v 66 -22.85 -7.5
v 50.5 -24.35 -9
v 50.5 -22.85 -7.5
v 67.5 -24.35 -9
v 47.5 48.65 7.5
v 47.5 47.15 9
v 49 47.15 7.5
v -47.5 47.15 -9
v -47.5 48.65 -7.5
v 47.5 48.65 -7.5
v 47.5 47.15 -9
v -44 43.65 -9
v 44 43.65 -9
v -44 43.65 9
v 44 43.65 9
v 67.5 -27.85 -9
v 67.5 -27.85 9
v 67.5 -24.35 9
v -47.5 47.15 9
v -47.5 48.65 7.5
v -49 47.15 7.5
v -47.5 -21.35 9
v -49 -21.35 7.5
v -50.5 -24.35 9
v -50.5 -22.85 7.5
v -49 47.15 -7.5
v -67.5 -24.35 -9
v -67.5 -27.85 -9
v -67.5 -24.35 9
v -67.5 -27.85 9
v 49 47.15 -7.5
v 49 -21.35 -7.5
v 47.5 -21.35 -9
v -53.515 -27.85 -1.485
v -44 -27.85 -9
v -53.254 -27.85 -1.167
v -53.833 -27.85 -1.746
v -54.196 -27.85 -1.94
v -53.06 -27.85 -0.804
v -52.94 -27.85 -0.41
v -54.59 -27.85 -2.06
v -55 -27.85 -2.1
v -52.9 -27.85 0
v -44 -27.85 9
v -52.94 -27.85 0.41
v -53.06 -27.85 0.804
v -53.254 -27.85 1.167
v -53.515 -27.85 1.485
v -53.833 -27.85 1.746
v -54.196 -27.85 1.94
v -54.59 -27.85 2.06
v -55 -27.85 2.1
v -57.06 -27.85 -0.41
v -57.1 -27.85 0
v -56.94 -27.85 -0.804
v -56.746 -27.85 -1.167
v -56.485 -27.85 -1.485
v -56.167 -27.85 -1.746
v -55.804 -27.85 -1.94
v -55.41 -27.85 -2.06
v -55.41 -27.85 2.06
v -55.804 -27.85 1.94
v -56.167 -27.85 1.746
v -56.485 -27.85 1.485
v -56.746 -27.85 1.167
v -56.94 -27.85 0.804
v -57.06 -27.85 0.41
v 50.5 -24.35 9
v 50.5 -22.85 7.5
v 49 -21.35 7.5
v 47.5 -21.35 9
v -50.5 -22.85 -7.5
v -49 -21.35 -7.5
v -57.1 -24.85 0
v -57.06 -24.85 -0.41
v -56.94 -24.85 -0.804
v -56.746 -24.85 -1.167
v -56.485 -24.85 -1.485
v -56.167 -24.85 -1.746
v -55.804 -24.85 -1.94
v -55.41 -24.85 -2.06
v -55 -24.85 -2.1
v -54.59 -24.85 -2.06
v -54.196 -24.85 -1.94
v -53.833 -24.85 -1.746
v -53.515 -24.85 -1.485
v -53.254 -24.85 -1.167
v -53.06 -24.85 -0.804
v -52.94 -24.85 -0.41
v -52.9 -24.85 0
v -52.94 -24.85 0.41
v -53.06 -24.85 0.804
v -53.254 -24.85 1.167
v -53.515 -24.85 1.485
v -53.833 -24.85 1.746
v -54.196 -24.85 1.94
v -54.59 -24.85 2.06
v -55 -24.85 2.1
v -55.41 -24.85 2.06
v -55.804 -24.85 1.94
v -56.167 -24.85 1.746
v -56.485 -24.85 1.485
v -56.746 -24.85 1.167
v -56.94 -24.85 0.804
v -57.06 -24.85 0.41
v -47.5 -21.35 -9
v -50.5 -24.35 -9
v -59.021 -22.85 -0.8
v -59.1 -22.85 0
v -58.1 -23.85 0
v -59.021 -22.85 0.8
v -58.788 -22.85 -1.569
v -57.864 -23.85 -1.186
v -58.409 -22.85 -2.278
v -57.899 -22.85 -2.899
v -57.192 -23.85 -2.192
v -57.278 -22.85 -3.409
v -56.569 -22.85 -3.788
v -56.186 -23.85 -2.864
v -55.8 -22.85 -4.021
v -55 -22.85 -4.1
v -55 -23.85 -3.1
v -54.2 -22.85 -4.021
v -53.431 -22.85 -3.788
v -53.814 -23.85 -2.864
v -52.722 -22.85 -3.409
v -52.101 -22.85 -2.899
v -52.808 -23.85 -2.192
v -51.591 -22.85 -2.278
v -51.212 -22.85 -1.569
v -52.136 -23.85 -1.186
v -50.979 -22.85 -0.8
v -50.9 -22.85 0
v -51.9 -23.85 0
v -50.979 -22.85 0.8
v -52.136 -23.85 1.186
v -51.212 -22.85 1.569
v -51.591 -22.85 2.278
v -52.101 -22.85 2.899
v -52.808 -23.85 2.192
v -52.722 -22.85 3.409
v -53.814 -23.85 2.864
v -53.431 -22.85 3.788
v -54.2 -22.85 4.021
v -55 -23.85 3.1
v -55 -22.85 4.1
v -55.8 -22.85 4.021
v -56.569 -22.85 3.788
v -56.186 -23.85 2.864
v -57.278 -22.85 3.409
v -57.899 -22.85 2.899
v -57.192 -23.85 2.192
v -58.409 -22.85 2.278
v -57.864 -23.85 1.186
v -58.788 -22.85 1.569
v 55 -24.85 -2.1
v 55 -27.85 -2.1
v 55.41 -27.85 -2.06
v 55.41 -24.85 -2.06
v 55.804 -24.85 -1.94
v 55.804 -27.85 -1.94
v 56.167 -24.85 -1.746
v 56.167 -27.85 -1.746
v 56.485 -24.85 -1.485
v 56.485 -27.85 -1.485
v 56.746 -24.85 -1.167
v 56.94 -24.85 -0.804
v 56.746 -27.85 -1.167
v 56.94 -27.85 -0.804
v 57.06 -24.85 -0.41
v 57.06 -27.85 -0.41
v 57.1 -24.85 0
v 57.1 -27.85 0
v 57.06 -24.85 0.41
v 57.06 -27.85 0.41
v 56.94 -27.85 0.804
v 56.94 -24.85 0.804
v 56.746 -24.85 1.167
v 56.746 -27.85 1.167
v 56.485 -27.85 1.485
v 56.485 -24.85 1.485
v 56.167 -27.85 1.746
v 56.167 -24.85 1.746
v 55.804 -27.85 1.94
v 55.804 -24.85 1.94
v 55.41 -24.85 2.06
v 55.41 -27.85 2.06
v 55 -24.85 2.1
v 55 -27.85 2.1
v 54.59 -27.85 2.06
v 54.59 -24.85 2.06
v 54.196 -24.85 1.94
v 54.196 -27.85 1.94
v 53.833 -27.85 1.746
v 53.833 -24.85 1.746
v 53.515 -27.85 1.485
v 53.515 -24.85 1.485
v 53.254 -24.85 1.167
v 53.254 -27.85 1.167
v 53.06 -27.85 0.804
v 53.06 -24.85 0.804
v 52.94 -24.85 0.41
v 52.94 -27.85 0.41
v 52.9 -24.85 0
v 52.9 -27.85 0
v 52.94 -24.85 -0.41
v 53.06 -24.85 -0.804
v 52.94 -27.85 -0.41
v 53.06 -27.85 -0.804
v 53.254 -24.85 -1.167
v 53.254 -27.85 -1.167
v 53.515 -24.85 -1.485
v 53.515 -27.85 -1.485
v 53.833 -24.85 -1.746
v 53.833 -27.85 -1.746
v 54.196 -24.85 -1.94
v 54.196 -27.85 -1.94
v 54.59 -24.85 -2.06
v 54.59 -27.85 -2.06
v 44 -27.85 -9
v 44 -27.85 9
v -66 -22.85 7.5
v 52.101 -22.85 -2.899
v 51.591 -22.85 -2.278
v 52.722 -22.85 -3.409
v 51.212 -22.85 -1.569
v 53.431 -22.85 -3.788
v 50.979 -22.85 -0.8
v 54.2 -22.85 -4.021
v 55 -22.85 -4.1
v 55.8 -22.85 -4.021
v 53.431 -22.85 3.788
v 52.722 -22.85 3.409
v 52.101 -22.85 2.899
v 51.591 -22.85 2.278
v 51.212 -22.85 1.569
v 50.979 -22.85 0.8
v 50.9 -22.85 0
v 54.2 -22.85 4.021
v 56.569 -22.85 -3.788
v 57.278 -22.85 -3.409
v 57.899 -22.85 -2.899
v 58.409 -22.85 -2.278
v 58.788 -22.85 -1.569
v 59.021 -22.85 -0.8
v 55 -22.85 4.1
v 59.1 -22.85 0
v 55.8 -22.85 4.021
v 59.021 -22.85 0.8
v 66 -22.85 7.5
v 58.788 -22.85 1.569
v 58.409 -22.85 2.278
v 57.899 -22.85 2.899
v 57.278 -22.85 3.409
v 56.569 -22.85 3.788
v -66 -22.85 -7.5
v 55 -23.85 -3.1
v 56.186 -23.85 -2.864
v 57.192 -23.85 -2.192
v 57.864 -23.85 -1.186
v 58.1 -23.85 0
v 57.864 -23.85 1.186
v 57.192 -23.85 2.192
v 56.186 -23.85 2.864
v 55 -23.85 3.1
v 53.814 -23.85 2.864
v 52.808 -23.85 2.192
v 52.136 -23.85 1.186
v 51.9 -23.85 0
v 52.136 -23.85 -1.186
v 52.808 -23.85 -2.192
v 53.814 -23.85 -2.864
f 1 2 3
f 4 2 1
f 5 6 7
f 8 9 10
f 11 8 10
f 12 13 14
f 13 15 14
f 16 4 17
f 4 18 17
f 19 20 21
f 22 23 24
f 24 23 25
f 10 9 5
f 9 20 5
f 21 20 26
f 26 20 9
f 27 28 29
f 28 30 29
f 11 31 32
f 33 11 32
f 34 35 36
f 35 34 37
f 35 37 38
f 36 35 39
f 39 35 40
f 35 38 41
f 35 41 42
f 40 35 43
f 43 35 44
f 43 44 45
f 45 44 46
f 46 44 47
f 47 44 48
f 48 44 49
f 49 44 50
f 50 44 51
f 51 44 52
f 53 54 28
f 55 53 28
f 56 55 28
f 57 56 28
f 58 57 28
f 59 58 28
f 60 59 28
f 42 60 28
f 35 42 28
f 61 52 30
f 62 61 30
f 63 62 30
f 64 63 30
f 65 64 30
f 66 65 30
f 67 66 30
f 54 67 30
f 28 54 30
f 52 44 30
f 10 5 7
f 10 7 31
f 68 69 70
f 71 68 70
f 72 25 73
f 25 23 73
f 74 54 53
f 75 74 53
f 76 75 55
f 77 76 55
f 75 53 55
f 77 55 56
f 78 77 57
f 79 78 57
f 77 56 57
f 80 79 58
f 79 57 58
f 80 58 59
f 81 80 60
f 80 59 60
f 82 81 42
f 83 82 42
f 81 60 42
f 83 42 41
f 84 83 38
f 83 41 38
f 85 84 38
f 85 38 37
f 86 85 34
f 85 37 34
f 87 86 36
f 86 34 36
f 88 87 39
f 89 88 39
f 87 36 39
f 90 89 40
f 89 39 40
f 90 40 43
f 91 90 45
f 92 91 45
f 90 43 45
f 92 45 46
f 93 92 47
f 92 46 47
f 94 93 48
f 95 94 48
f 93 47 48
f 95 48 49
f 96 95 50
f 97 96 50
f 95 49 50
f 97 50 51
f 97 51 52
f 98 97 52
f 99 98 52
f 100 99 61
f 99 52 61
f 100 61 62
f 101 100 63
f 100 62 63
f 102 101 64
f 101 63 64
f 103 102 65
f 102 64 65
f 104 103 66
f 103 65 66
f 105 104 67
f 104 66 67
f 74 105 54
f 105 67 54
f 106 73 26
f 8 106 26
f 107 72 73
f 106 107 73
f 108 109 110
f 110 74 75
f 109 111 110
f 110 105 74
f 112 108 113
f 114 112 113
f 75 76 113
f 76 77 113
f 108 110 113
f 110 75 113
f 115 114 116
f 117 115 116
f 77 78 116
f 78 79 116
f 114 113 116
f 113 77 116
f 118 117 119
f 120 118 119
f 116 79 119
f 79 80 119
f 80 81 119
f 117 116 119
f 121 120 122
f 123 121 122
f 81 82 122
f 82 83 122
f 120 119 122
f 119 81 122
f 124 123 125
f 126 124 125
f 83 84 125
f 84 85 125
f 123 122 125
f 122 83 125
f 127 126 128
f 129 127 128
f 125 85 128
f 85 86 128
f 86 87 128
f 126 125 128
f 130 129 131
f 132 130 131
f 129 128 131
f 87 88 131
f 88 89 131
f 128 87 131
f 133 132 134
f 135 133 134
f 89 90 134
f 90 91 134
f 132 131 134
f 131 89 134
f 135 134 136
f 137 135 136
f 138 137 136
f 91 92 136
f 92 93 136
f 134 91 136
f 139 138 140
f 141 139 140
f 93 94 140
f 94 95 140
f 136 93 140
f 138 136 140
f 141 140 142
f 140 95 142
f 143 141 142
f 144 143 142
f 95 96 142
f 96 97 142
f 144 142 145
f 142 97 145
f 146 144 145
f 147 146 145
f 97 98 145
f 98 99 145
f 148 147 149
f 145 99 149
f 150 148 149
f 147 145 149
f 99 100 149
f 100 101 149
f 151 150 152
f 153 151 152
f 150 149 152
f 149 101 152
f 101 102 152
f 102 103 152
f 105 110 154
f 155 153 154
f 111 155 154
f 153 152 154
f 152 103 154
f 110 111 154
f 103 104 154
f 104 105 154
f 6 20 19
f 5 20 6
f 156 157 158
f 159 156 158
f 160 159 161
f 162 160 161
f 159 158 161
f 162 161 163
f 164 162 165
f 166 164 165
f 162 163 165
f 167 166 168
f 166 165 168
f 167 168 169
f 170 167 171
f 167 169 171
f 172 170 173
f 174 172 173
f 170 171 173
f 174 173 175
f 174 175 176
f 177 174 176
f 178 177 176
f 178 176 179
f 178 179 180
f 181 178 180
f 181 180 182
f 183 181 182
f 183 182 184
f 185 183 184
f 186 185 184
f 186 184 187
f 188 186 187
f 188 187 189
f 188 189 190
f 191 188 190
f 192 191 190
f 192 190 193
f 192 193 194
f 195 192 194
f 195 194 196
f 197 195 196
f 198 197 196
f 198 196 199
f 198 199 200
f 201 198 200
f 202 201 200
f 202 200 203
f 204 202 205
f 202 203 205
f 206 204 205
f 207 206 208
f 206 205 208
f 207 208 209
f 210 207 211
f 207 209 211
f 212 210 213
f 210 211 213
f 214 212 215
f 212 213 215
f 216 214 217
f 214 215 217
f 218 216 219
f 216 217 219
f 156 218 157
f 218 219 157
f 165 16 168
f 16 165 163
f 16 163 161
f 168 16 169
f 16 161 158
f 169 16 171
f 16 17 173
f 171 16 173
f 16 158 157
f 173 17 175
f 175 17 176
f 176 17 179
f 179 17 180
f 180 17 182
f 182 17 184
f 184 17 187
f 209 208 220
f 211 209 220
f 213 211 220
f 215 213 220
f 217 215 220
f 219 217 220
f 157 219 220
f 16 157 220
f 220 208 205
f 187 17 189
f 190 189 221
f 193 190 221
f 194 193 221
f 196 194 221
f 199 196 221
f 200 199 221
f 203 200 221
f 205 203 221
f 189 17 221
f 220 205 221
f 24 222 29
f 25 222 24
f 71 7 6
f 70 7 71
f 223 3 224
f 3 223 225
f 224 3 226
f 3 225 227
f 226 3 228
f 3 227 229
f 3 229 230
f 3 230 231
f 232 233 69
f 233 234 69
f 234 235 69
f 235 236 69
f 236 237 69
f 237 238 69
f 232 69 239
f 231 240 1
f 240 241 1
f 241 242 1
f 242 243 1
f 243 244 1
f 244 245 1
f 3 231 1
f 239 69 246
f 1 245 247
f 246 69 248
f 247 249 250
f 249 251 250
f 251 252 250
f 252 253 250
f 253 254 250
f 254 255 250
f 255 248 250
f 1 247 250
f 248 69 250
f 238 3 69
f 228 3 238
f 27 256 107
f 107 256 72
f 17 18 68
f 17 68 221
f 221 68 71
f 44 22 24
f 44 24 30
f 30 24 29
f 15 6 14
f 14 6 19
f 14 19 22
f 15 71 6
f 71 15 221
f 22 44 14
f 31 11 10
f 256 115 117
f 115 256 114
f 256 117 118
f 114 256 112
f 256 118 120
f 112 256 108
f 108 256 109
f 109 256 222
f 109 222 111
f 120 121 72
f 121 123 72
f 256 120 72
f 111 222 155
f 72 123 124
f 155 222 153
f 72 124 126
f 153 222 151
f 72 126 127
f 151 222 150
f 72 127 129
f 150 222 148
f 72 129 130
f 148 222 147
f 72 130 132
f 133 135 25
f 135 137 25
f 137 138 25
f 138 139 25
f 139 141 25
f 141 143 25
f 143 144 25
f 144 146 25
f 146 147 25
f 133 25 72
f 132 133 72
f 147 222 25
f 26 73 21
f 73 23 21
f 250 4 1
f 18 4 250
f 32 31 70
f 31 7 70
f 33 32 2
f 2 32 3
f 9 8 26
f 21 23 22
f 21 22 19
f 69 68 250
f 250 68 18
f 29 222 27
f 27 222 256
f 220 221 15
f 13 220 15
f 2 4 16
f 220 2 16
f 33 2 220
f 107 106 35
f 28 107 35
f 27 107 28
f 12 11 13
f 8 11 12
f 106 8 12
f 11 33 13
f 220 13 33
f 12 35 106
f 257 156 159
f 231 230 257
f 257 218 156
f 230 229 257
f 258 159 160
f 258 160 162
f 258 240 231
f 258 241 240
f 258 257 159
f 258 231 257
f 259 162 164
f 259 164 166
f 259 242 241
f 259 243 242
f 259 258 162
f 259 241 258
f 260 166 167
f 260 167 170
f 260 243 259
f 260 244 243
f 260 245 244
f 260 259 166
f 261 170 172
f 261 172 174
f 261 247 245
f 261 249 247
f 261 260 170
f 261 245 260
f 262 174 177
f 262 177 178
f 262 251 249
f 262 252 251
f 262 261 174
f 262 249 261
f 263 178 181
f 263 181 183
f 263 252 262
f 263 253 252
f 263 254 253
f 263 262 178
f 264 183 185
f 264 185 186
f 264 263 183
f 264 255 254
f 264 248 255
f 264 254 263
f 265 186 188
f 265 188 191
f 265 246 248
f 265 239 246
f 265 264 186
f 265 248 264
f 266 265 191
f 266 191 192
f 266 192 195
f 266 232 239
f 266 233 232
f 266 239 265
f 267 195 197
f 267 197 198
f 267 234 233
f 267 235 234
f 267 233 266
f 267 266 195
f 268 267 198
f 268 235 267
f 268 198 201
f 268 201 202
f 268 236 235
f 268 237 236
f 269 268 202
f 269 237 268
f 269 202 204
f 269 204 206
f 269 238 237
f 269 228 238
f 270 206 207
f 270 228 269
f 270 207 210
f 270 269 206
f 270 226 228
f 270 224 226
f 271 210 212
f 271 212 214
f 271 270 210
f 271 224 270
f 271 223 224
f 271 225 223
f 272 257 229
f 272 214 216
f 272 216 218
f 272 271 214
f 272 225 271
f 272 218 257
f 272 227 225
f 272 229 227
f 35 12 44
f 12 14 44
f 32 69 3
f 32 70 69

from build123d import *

# Parameters (mm, degrees)
BOSS_EXTRUDE1_DEPTH = 9
SKETCH2_R           = 2.1
CUT_EXTRUDE1_DEPTH  = 9
CHAMFER1_SIZE       = 2
CHAMFER2_SIZE       = 1.5


with BuildPart() as part:
    # Sketch1 → Boss-Extrude1 (new, symmetric)
    with BuildSketch(Plane.XY):
        Polygon((44, -27.85), (44, 43.65), (-44, 43.65), (-44, -27.85), (-67.5, -27.85), (-67.5, -22.85), (-49, -22.85), (-49, 48.65), (49, 48.65), (49, -22.85), (67.5, -22.85), (67.5, -27.85), align=None)
    extrude(amount=BOSS_EXTRUDE1_DEPTH, both=True)

    # Sketch2 → Cut-Extrude1 (cut, symmetric)
    with BuildSketch(Plane.XZ.offset(27.85)):
        with Locations(Location((55, 0, 0), (0, 0, 270))):
            Circle(SKETCH2_R)
        with Locations(Location((-55, 0, 0), (0, 0, 180))):
            Circle(SKETCH2_R)
    extrude(amount=CUT_EXTRUDE1_DEPTH, both=True, mode=Mode.SUBTRACT)

    # Chamfer1
    chamfer1_edges = [part.edges().sort_by_distance(p)[0] for p in [
        (55, -22.85, 2.1),
        (-52.9, -22.85, 0),
    ]]
    chamfer(chamfer1_edges, length=CHAMFER1_SIZE)

    # Chamfer2
    chamfer2_edges = [part.edges().sort_by_distance(p)[0] for p in [
        (58.25, -22.85, 9),
        (-58.25, -22.85, -9),
        (-49, 12.9, -9),
        (0, 48.65, -9),
        (49, 12.9, -9),
        (58.25, -22.85, -9),
        (49, 12.9, 9),
        (0, 48.65, 9),
        (-67.5, -22.85, 0),
        (-49, -22.85, 0),
        (-49, 48.65, 0),
        (49, 48.65, 0),
        (49, -22.85, 0),
        (67.5, -22.85, 0),
        (-49, 12.9, 9),
        (-58.25, -22.85, 9),
    ]]
    chamfer(chamfer2_edges, length=CHAMFER2_SIZE)


solid = part.part
